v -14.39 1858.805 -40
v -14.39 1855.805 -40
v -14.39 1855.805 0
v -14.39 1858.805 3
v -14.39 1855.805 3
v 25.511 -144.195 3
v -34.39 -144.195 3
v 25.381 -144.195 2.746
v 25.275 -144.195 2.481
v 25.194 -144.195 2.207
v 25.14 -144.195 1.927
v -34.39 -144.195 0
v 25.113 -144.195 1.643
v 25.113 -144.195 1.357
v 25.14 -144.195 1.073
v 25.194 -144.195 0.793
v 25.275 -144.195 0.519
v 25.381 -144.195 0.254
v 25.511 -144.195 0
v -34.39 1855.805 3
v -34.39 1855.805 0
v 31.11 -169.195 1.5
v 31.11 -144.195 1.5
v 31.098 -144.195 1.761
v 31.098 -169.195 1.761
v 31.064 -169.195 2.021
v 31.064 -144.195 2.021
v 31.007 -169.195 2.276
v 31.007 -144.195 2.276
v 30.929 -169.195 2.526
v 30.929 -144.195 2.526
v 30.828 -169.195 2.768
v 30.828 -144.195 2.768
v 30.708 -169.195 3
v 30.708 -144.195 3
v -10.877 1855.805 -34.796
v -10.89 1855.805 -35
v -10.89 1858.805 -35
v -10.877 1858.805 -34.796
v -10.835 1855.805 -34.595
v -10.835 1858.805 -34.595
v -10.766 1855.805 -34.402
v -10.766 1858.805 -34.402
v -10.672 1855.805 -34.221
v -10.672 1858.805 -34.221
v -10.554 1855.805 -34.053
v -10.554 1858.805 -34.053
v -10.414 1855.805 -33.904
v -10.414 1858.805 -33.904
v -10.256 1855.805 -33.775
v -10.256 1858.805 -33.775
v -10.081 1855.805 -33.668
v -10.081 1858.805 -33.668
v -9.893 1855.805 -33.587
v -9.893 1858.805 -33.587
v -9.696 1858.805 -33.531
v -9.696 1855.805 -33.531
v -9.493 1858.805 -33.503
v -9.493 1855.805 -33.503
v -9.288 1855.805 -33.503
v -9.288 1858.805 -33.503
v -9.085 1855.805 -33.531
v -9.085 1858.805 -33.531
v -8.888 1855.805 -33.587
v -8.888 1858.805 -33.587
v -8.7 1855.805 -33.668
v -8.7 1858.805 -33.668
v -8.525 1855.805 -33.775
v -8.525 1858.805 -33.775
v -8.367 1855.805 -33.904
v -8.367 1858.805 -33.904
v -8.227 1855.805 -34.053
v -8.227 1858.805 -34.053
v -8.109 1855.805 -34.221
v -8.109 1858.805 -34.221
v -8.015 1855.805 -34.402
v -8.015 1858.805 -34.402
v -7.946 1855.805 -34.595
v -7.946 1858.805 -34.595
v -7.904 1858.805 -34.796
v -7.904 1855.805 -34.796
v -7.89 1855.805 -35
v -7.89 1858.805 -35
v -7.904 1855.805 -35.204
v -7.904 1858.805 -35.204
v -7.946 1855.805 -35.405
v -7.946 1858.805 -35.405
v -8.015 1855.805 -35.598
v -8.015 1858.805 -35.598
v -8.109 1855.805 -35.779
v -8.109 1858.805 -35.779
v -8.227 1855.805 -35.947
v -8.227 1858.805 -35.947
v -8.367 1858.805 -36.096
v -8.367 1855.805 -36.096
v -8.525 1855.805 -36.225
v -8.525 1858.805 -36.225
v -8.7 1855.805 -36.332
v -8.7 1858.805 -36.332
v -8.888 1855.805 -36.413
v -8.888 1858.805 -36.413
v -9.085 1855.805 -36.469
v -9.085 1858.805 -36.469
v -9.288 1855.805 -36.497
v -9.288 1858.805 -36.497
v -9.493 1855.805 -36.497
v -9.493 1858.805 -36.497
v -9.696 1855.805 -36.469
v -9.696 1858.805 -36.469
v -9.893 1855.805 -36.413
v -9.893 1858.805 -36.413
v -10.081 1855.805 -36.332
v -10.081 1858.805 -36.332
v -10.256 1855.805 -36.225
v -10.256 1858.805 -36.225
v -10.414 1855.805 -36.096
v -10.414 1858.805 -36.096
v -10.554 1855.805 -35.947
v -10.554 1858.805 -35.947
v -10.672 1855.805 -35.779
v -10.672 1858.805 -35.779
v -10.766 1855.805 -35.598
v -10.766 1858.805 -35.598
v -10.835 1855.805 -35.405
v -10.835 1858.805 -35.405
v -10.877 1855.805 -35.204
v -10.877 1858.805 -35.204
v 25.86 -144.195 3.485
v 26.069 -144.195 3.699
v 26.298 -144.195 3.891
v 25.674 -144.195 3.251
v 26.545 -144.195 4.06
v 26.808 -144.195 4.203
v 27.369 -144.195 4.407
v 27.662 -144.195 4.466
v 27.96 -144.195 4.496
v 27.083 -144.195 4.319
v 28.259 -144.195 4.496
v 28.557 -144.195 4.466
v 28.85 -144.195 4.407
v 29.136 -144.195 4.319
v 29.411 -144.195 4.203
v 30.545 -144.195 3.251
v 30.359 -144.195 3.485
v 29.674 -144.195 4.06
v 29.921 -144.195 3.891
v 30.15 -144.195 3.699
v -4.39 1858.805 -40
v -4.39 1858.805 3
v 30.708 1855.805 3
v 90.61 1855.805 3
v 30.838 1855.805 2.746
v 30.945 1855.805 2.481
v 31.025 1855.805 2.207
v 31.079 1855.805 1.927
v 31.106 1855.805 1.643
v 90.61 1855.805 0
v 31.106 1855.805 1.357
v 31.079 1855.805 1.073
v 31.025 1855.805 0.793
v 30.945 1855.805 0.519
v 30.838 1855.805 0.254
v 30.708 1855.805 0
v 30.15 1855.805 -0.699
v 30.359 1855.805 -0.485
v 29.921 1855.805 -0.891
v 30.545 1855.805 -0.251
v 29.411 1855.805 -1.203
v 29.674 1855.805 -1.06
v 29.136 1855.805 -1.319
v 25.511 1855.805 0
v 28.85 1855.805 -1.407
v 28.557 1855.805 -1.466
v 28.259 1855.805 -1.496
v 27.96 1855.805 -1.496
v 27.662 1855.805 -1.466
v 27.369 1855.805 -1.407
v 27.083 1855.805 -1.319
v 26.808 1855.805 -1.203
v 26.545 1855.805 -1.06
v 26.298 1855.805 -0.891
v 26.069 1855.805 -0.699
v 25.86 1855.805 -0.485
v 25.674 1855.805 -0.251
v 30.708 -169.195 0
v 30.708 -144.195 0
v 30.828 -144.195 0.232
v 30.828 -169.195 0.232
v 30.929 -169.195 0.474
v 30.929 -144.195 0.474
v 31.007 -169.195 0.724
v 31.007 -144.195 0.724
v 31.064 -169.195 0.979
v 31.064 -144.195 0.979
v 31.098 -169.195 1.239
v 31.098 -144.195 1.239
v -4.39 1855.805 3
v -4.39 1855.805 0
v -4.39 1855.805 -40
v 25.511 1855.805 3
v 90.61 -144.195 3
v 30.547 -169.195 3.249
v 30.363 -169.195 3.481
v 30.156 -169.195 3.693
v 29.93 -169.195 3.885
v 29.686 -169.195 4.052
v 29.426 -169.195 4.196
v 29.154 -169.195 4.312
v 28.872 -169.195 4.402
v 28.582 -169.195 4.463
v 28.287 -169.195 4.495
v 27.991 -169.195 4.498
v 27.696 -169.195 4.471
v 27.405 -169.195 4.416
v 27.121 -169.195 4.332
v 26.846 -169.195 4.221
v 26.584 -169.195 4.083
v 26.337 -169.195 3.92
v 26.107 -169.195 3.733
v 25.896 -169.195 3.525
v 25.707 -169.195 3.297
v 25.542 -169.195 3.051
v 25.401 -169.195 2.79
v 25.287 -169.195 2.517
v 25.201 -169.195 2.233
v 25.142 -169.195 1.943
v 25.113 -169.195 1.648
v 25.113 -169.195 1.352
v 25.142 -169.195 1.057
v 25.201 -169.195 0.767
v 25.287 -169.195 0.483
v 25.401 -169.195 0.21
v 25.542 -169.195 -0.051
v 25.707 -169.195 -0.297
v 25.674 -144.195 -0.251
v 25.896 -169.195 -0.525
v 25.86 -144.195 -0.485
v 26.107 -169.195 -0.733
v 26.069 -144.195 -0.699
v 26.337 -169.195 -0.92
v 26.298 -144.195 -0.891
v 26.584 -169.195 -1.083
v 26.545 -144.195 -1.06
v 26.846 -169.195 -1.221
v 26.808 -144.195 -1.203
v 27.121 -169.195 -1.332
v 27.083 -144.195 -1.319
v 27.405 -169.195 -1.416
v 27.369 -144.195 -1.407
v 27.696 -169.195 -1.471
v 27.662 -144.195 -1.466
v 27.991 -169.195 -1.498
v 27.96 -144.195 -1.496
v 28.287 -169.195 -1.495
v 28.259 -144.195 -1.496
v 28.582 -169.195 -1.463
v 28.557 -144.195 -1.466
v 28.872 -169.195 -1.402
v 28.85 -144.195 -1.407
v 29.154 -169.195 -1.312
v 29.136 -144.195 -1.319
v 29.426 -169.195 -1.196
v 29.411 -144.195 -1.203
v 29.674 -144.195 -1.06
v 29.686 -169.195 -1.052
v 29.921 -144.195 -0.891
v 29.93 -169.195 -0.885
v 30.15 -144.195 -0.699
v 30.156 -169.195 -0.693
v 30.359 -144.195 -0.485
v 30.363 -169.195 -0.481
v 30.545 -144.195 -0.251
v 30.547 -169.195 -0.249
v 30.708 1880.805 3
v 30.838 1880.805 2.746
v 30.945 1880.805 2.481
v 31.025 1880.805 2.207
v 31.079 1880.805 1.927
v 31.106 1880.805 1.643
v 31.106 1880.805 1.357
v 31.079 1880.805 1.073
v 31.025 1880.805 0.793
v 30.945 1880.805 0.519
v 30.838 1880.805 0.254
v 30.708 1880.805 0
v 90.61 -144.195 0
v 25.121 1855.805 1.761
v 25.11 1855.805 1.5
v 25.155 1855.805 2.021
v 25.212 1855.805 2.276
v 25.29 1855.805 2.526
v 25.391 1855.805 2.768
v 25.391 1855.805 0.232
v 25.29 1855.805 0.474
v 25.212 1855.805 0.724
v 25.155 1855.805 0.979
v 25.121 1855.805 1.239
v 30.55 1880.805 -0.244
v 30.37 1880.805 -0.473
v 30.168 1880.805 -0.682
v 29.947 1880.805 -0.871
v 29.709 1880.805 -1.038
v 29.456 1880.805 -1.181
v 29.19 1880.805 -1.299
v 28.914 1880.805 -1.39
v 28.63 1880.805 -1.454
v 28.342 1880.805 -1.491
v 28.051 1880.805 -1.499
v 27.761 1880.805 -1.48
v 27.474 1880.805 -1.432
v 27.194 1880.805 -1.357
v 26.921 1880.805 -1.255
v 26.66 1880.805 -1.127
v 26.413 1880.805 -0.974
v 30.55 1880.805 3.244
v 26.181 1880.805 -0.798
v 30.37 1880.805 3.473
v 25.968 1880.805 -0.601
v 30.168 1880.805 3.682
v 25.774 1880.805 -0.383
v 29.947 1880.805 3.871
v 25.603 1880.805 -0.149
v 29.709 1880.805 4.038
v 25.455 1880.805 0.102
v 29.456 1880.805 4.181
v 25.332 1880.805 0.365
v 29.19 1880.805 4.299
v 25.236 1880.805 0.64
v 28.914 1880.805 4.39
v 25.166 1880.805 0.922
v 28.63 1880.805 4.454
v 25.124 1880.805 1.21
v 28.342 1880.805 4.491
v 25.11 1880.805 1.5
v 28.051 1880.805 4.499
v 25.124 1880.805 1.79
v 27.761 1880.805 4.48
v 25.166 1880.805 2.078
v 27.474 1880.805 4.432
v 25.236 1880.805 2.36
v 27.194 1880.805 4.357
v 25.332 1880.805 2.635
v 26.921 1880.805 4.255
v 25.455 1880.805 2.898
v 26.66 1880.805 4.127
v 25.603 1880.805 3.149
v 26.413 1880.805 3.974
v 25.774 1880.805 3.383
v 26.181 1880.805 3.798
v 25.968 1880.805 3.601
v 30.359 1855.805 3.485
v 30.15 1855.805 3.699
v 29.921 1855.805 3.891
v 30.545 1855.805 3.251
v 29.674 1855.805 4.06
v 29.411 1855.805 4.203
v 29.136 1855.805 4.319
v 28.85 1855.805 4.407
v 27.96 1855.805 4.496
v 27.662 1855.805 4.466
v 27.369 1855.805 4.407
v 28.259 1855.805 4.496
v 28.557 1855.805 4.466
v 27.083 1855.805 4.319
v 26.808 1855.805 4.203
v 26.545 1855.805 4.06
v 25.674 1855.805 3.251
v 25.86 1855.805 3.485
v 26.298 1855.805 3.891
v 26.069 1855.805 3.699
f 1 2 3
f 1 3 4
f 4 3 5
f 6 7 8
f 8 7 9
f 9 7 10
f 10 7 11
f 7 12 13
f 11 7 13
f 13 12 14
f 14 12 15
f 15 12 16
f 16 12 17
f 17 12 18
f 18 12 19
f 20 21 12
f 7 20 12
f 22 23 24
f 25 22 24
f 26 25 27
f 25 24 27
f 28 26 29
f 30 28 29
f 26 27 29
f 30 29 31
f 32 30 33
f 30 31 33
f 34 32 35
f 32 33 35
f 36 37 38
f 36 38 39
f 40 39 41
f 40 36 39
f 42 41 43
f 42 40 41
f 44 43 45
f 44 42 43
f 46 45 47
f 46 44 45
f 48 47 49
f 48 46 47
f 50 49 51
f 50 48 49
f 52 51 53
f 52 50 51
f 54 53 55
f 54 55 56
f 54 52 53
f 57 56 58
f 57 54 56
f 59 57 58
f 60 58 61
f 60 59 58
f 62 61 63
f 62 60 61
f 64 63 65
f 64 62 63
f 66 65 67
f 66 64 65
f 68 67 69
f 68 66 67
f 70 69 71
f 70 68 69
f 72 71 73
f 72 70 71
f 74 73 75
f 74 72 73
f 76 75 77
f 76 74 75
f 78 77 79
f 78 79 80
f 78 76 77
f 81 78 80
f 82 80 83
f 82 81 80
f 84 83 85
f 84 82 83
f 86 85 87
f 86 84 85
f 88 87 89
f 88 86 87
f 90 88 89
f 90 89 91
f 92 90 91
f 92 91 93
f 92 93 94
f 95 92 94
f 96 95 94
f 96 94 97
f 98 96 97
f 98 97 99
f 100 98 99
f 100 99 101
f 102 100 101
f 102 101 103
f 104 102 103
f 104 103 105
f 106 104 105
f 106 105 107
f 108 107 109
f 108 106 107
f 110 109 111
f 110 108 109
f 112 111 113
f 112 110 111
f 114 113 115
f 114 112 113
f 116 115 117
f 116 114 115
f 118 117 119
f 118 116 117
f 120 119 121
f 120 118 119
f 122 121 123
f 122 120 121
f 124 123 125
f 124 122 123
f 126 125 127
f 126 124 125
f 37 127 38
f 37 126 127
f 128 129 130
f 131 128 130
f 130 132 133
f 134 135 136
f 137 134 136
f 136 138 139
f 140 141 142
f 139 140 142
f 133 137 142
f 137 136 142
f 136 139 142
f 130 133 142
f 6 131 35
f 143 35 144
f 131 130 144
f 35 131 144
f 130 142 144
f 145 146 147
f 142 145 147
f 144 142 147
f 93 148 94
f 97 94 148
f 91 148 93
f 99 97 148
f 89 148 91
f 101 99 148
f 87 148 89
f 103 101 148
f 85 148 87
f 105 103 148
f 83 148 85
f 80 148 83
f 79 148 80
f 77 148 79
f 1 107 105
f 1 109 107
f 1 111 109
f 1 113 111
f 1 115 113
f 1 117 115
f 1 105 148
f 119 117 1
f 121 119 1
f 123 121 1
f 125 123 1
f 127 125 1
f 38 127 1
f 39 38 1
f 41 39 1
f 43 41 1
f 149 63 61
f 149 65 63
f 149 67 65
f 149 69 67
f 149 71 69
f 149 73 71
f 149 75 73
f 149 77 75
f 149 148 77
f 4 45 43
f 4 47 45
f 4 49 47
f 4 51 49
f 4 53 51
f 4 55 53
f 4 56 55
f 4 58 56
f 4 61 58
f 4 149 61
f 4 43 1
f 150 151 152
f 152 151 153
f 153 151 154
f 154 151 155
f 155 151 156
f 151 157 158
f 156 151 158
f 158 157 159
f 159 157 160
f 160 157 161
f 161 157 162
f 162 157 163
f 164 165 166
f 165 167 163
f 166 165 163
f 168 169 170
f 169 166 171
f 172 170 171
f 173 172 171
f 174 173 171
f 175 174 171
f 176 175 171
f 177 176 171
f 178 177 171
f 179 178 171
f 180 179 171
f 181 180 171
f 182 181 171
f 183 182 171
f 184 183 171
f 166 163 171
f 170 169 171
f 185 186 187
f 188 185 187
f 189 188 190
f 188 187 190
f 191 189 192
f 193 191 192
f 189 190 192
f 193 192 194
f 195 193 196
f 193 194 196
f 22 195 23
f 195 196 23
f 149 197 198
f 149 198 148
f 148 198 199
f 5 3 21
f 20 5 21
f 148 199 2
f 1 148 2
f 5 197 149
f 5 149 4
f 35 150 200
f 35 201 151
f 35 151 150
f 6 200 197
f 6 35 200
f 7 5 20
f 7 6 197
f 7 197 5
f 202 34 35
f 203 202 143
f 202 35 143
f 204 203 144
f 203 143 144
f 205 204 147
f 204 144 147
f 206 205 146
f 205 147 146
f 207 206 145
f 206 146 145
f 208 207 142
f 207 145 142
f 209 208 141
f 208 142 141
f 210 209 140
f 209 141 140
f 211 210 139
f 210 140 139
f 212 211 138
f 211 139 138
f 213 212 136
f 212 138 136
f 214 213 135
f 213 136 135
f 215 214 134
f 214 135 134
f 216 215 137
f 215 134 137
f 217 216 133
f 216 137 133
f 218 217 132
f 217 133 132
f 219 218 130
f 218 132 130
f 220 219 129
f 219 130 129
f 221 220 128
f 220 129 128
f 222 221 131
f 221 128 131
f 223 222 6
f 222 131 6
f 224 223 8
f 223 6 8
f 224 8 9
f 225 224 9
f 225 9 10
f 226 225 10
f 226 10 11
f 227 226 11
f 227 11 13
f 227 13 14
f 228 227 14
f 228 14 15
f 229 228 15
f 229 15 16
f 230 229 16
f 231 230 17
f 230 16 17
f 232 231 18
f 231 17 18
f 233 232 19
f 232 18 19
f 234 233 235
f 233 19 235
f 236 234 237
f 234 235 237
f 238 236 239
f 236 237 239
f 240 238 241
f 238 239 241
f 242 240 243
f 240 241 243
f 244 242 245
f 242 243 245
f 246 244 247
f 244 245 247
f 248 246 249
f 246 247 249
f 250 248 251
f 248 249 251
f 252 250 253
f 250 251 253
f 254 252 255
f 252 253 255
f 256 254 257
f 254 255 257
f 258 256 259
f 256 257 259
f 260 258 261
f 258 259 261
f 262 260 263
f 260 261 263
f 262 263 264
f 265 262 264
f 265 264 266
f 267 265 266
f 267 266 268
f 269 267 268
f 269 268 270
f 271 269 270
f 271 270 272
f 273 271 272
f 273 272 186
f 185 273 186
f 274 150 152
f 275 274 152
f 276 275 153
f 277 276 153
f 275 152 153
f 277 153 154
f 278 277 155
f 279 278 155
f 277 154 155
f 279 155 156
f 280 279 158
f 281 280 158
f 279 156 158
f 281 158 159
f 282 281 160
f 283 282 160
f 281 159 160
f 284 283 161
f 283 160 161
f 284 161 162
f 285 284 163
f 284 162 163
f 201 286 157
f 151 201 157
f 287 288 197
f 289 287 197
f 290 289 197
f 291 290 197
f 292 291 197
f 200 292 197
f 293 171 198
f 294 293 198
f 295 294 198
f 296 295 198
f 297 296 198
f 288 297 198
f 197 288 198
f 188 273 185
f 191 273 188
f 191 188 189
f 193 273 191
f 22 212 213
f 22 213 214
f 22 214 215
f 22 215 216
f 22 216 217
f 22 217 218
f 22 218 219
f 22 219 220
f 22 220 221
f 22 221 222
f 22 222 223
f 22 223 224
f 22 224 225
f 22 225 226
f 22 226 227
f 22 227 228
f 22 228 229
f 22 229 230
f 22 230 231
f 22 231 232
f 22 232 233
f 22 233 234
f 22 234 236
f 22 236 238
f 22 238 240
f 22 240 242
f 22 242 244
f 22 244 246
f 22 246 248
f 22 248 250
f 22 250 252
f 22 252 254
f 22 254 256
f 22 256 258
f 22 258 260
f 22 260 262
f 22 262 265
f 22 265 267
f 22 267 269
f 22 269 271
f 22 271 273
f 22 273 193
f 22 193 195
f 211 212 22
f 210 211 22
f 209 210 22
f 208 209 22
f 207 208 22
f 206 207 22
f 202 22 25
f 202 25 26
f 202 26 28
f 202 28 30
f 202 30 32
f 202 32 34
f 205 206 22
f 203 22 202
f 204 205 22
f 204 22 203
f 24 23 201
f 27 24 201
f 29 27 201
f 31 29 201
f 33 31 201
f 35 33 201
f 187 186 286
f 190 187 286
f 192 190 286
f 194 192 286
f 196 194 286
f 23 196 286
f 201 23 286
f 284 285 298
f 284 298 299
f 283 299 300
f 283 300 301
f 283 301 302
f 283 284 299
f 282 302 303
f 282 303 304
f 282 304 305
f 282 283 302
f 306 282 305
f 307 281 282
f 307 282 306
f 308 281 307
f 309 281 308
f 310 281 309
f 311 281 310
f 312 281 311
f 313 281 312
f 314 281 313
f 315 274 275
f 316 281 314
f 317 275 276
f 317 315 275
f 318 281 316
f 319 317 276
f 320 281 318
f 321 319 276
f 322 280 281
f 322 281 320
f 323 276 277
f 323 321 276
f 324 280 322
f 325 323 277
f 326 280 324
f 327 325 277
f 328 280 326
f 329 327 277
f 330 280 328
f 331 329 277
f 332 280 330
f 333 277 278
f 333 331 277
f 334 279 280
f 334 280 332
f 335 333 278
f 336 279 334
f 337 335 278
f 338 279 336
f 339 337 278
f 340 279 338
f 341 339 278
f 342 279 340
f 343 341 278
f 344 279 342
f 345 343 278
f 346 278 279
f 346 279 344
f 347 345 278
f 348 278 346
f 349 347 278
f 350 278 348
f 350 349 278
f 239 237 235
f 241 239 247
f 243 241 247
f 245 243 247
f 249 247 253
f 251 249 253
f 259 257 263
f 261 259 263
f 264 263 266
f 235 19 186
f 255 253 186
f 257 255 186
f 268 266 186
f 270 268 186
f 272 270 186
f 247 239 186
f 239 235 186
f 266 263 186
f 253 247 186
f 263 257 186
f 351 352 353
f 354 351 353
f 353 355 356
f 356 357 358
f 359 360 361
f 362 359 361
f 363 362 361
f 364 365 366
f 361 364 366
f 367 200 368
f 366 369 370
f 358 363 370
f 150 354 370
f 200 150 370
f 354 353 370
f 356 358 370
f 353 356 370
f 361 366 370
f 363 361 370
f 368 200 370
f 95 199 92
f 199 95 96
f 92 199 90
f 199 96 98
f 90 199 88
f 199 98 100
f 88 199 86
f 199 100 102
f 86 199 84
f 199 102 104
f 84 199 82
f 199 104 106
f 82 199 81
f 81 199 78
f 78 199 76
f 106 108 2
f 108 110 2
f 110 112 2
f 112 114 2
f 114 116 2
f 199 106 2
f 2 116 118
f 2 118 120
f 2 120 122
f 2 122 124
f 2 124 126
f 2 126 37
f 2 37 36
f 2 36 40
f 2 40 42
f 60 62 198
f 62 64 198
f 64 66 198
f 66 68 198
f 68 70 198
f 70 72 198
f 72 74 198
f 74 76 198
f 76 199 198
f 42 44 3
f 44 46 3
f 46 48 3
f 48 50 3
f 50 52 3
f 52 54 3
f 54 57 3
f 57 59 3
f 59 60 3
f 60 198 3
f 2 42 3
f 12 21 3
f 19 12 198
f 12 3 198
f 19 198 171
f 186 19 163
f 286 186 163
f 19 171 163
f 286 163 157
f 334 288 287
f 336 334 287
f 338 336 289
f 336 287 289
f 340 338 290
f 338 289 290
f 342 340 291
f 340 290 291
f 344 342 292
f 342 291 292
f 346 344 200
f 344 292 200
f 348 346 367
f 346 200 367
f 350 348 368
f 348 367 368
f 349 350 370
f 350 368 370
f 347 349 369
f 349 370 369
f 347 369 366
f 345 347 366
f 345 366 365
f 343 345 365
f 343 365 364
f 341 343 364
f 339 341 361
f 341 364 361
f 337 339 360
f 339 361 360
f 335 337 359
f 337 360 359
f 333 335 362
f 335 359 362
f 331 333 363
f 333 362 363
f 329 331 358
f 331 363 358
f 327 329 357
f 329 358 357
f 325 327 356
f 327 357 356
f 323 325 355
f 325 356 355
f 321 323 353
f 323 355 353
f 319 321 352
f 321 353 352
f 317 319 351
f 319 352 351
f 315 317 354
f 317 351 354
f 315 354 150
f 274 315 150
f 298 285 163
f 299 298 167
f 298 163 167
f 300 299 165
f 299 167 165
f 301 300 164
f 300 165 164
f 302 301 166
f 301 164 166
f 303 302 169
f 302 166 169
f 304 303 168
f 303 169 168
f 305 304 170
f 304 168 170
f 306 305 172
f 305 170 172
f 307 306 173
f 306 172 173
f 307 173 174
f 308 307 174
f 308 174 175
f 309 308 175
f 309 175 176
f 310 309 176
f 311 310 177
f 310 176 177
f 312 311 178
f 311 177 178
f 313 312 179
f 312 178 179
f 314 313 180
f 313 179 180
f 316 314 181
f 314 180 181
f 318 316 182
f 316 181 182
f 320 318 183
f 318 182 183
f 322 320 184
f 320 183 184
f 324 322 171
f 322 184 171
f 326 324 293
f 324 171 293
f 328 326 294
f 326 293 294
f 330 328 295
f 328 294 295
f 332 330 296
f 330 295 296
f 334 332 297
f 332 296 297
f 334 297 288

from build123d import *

# Parameters (mm, degrees)
F1_DEPTH = 3
F2_W     = 10
F2_H     = 3
F2_H_2   = 40
F2_R     = 1.5
F3_DEPTH = 3
F5_DEPTH = 25
F7_DEPTH = 25


# Not quite as in the source:
# - a feature names something its author has since deleted; it is built from what else it names


with BuildPart() as f1:
    # F0 (on Top) → F1 (new body)
    with BuildSketch(Plane.XY):
        Polygon((25.6095033884, 1855.804875493), (-34.3904966116, 1855.804875493), (-34.3904966116, -144.195124507), (25.6095033884, -144.195124507), (25.6095033884, -164.195124507), (30.6095033884, -164.195124507), (30.6095033884, -144.195124507), (90.6095033884, -144.195124507), (90.6095033884, 1855.804875493), (30.6095033884, 1855.804875493), (30.6095033884, 1875.804875493), (25.6095033884, 1875.804875493), align=None)
    extrude(amount=F1_DEPTH)

    # F2 (on face) → F3 (join)
    with BuildSketch(Plane(origin=(0, 1855.804875493, 0), x_dir=(-1, 0, 0), z_dir=(0, 1, 0))):
        with Locations((9.3904966116, 1.5)):
            Rectangle(F2_W, F2_H)
        with Locations((9.3904966116, -20)):
            Rectangle(F2_W, F2_H_2)
        with Locations((9.3904966116, -35)):
            Circle(F2_R, mode=Mode.SUBTRACT)
    extrude(amount=F3_DEPTH)

    # F4 (on face) → F5 (join)
    with BuildSketch(Plane.XZ.offset(144.195124507)):
        with BuildLine():
            Line((30.6095033884, 3), (30.7075795998, 3))
            ThreePointArc((30.7075795998, 3), (25.1095033884, 1.5), (30.7075795998, 0))
            Line((30.7075795998, 0), (30.6095033884, 0))
            Line((30.6095033884, 0), (30.6095033884, 3))
        make_face()
        with BuildLine():
            ThreePointArc((30.7075795998, 0), (31.0072808673, 0.7235428647), (31.1095033884, 1.5))
            ThreePointArc((31.1095033884, 1.5), (31.0072808673, 2.2764571353), (30.7075795998, 3))
            Line((30.7075795998, 3), (30.6095033884, 3))
            Line((30.6095033884, 3), (30.6095033884, 0))
            Line((30.6095033884, 0), (30.7075795998, 0))
        make_face()
    extrude(amount=F5_DEPTH)

    # F6 (on face) → F7 (join)
    with BuildSketch(Plane(origin=(0, 1855.804875493, 0), x_dir=(-1, 0, 0), z_dir=(0, 1, 0))):
        with BuildLine():
            Line((-30.6095033884, 3), (-30.7075795998, 3))
            ThreePointArc((-30.7075795998, 3), (-31.1095033884, 1.5), (-30.7075795998, 0))
            Line((-30.7075795998, 0), (-30.6095033884, 0))
            Line((-30.6095033884, 0), (-30.6095033884, 3))
        make_face()
        with BuildLine():
            ThreePointArc((-30.7075795998, 0), (-27.3330462531, -1.3977774789), (-25.1095033884, 1.5))
            ThreePointArc((-25.1095033884, 1.5), (-27.3330462531, 4.3977774789), (-30.7075795998, 3))
            Line((-30.7075795998, 3), (-30.6095033884, 3))
            Line((-30.6095033884, 3), (-30.6095033884, 0))
            Line((-30.6095033884, 0), (-30.7075795998, 0))
        make_face()
    extrude(amount=F7_DEPTH)


solid = f1.part
